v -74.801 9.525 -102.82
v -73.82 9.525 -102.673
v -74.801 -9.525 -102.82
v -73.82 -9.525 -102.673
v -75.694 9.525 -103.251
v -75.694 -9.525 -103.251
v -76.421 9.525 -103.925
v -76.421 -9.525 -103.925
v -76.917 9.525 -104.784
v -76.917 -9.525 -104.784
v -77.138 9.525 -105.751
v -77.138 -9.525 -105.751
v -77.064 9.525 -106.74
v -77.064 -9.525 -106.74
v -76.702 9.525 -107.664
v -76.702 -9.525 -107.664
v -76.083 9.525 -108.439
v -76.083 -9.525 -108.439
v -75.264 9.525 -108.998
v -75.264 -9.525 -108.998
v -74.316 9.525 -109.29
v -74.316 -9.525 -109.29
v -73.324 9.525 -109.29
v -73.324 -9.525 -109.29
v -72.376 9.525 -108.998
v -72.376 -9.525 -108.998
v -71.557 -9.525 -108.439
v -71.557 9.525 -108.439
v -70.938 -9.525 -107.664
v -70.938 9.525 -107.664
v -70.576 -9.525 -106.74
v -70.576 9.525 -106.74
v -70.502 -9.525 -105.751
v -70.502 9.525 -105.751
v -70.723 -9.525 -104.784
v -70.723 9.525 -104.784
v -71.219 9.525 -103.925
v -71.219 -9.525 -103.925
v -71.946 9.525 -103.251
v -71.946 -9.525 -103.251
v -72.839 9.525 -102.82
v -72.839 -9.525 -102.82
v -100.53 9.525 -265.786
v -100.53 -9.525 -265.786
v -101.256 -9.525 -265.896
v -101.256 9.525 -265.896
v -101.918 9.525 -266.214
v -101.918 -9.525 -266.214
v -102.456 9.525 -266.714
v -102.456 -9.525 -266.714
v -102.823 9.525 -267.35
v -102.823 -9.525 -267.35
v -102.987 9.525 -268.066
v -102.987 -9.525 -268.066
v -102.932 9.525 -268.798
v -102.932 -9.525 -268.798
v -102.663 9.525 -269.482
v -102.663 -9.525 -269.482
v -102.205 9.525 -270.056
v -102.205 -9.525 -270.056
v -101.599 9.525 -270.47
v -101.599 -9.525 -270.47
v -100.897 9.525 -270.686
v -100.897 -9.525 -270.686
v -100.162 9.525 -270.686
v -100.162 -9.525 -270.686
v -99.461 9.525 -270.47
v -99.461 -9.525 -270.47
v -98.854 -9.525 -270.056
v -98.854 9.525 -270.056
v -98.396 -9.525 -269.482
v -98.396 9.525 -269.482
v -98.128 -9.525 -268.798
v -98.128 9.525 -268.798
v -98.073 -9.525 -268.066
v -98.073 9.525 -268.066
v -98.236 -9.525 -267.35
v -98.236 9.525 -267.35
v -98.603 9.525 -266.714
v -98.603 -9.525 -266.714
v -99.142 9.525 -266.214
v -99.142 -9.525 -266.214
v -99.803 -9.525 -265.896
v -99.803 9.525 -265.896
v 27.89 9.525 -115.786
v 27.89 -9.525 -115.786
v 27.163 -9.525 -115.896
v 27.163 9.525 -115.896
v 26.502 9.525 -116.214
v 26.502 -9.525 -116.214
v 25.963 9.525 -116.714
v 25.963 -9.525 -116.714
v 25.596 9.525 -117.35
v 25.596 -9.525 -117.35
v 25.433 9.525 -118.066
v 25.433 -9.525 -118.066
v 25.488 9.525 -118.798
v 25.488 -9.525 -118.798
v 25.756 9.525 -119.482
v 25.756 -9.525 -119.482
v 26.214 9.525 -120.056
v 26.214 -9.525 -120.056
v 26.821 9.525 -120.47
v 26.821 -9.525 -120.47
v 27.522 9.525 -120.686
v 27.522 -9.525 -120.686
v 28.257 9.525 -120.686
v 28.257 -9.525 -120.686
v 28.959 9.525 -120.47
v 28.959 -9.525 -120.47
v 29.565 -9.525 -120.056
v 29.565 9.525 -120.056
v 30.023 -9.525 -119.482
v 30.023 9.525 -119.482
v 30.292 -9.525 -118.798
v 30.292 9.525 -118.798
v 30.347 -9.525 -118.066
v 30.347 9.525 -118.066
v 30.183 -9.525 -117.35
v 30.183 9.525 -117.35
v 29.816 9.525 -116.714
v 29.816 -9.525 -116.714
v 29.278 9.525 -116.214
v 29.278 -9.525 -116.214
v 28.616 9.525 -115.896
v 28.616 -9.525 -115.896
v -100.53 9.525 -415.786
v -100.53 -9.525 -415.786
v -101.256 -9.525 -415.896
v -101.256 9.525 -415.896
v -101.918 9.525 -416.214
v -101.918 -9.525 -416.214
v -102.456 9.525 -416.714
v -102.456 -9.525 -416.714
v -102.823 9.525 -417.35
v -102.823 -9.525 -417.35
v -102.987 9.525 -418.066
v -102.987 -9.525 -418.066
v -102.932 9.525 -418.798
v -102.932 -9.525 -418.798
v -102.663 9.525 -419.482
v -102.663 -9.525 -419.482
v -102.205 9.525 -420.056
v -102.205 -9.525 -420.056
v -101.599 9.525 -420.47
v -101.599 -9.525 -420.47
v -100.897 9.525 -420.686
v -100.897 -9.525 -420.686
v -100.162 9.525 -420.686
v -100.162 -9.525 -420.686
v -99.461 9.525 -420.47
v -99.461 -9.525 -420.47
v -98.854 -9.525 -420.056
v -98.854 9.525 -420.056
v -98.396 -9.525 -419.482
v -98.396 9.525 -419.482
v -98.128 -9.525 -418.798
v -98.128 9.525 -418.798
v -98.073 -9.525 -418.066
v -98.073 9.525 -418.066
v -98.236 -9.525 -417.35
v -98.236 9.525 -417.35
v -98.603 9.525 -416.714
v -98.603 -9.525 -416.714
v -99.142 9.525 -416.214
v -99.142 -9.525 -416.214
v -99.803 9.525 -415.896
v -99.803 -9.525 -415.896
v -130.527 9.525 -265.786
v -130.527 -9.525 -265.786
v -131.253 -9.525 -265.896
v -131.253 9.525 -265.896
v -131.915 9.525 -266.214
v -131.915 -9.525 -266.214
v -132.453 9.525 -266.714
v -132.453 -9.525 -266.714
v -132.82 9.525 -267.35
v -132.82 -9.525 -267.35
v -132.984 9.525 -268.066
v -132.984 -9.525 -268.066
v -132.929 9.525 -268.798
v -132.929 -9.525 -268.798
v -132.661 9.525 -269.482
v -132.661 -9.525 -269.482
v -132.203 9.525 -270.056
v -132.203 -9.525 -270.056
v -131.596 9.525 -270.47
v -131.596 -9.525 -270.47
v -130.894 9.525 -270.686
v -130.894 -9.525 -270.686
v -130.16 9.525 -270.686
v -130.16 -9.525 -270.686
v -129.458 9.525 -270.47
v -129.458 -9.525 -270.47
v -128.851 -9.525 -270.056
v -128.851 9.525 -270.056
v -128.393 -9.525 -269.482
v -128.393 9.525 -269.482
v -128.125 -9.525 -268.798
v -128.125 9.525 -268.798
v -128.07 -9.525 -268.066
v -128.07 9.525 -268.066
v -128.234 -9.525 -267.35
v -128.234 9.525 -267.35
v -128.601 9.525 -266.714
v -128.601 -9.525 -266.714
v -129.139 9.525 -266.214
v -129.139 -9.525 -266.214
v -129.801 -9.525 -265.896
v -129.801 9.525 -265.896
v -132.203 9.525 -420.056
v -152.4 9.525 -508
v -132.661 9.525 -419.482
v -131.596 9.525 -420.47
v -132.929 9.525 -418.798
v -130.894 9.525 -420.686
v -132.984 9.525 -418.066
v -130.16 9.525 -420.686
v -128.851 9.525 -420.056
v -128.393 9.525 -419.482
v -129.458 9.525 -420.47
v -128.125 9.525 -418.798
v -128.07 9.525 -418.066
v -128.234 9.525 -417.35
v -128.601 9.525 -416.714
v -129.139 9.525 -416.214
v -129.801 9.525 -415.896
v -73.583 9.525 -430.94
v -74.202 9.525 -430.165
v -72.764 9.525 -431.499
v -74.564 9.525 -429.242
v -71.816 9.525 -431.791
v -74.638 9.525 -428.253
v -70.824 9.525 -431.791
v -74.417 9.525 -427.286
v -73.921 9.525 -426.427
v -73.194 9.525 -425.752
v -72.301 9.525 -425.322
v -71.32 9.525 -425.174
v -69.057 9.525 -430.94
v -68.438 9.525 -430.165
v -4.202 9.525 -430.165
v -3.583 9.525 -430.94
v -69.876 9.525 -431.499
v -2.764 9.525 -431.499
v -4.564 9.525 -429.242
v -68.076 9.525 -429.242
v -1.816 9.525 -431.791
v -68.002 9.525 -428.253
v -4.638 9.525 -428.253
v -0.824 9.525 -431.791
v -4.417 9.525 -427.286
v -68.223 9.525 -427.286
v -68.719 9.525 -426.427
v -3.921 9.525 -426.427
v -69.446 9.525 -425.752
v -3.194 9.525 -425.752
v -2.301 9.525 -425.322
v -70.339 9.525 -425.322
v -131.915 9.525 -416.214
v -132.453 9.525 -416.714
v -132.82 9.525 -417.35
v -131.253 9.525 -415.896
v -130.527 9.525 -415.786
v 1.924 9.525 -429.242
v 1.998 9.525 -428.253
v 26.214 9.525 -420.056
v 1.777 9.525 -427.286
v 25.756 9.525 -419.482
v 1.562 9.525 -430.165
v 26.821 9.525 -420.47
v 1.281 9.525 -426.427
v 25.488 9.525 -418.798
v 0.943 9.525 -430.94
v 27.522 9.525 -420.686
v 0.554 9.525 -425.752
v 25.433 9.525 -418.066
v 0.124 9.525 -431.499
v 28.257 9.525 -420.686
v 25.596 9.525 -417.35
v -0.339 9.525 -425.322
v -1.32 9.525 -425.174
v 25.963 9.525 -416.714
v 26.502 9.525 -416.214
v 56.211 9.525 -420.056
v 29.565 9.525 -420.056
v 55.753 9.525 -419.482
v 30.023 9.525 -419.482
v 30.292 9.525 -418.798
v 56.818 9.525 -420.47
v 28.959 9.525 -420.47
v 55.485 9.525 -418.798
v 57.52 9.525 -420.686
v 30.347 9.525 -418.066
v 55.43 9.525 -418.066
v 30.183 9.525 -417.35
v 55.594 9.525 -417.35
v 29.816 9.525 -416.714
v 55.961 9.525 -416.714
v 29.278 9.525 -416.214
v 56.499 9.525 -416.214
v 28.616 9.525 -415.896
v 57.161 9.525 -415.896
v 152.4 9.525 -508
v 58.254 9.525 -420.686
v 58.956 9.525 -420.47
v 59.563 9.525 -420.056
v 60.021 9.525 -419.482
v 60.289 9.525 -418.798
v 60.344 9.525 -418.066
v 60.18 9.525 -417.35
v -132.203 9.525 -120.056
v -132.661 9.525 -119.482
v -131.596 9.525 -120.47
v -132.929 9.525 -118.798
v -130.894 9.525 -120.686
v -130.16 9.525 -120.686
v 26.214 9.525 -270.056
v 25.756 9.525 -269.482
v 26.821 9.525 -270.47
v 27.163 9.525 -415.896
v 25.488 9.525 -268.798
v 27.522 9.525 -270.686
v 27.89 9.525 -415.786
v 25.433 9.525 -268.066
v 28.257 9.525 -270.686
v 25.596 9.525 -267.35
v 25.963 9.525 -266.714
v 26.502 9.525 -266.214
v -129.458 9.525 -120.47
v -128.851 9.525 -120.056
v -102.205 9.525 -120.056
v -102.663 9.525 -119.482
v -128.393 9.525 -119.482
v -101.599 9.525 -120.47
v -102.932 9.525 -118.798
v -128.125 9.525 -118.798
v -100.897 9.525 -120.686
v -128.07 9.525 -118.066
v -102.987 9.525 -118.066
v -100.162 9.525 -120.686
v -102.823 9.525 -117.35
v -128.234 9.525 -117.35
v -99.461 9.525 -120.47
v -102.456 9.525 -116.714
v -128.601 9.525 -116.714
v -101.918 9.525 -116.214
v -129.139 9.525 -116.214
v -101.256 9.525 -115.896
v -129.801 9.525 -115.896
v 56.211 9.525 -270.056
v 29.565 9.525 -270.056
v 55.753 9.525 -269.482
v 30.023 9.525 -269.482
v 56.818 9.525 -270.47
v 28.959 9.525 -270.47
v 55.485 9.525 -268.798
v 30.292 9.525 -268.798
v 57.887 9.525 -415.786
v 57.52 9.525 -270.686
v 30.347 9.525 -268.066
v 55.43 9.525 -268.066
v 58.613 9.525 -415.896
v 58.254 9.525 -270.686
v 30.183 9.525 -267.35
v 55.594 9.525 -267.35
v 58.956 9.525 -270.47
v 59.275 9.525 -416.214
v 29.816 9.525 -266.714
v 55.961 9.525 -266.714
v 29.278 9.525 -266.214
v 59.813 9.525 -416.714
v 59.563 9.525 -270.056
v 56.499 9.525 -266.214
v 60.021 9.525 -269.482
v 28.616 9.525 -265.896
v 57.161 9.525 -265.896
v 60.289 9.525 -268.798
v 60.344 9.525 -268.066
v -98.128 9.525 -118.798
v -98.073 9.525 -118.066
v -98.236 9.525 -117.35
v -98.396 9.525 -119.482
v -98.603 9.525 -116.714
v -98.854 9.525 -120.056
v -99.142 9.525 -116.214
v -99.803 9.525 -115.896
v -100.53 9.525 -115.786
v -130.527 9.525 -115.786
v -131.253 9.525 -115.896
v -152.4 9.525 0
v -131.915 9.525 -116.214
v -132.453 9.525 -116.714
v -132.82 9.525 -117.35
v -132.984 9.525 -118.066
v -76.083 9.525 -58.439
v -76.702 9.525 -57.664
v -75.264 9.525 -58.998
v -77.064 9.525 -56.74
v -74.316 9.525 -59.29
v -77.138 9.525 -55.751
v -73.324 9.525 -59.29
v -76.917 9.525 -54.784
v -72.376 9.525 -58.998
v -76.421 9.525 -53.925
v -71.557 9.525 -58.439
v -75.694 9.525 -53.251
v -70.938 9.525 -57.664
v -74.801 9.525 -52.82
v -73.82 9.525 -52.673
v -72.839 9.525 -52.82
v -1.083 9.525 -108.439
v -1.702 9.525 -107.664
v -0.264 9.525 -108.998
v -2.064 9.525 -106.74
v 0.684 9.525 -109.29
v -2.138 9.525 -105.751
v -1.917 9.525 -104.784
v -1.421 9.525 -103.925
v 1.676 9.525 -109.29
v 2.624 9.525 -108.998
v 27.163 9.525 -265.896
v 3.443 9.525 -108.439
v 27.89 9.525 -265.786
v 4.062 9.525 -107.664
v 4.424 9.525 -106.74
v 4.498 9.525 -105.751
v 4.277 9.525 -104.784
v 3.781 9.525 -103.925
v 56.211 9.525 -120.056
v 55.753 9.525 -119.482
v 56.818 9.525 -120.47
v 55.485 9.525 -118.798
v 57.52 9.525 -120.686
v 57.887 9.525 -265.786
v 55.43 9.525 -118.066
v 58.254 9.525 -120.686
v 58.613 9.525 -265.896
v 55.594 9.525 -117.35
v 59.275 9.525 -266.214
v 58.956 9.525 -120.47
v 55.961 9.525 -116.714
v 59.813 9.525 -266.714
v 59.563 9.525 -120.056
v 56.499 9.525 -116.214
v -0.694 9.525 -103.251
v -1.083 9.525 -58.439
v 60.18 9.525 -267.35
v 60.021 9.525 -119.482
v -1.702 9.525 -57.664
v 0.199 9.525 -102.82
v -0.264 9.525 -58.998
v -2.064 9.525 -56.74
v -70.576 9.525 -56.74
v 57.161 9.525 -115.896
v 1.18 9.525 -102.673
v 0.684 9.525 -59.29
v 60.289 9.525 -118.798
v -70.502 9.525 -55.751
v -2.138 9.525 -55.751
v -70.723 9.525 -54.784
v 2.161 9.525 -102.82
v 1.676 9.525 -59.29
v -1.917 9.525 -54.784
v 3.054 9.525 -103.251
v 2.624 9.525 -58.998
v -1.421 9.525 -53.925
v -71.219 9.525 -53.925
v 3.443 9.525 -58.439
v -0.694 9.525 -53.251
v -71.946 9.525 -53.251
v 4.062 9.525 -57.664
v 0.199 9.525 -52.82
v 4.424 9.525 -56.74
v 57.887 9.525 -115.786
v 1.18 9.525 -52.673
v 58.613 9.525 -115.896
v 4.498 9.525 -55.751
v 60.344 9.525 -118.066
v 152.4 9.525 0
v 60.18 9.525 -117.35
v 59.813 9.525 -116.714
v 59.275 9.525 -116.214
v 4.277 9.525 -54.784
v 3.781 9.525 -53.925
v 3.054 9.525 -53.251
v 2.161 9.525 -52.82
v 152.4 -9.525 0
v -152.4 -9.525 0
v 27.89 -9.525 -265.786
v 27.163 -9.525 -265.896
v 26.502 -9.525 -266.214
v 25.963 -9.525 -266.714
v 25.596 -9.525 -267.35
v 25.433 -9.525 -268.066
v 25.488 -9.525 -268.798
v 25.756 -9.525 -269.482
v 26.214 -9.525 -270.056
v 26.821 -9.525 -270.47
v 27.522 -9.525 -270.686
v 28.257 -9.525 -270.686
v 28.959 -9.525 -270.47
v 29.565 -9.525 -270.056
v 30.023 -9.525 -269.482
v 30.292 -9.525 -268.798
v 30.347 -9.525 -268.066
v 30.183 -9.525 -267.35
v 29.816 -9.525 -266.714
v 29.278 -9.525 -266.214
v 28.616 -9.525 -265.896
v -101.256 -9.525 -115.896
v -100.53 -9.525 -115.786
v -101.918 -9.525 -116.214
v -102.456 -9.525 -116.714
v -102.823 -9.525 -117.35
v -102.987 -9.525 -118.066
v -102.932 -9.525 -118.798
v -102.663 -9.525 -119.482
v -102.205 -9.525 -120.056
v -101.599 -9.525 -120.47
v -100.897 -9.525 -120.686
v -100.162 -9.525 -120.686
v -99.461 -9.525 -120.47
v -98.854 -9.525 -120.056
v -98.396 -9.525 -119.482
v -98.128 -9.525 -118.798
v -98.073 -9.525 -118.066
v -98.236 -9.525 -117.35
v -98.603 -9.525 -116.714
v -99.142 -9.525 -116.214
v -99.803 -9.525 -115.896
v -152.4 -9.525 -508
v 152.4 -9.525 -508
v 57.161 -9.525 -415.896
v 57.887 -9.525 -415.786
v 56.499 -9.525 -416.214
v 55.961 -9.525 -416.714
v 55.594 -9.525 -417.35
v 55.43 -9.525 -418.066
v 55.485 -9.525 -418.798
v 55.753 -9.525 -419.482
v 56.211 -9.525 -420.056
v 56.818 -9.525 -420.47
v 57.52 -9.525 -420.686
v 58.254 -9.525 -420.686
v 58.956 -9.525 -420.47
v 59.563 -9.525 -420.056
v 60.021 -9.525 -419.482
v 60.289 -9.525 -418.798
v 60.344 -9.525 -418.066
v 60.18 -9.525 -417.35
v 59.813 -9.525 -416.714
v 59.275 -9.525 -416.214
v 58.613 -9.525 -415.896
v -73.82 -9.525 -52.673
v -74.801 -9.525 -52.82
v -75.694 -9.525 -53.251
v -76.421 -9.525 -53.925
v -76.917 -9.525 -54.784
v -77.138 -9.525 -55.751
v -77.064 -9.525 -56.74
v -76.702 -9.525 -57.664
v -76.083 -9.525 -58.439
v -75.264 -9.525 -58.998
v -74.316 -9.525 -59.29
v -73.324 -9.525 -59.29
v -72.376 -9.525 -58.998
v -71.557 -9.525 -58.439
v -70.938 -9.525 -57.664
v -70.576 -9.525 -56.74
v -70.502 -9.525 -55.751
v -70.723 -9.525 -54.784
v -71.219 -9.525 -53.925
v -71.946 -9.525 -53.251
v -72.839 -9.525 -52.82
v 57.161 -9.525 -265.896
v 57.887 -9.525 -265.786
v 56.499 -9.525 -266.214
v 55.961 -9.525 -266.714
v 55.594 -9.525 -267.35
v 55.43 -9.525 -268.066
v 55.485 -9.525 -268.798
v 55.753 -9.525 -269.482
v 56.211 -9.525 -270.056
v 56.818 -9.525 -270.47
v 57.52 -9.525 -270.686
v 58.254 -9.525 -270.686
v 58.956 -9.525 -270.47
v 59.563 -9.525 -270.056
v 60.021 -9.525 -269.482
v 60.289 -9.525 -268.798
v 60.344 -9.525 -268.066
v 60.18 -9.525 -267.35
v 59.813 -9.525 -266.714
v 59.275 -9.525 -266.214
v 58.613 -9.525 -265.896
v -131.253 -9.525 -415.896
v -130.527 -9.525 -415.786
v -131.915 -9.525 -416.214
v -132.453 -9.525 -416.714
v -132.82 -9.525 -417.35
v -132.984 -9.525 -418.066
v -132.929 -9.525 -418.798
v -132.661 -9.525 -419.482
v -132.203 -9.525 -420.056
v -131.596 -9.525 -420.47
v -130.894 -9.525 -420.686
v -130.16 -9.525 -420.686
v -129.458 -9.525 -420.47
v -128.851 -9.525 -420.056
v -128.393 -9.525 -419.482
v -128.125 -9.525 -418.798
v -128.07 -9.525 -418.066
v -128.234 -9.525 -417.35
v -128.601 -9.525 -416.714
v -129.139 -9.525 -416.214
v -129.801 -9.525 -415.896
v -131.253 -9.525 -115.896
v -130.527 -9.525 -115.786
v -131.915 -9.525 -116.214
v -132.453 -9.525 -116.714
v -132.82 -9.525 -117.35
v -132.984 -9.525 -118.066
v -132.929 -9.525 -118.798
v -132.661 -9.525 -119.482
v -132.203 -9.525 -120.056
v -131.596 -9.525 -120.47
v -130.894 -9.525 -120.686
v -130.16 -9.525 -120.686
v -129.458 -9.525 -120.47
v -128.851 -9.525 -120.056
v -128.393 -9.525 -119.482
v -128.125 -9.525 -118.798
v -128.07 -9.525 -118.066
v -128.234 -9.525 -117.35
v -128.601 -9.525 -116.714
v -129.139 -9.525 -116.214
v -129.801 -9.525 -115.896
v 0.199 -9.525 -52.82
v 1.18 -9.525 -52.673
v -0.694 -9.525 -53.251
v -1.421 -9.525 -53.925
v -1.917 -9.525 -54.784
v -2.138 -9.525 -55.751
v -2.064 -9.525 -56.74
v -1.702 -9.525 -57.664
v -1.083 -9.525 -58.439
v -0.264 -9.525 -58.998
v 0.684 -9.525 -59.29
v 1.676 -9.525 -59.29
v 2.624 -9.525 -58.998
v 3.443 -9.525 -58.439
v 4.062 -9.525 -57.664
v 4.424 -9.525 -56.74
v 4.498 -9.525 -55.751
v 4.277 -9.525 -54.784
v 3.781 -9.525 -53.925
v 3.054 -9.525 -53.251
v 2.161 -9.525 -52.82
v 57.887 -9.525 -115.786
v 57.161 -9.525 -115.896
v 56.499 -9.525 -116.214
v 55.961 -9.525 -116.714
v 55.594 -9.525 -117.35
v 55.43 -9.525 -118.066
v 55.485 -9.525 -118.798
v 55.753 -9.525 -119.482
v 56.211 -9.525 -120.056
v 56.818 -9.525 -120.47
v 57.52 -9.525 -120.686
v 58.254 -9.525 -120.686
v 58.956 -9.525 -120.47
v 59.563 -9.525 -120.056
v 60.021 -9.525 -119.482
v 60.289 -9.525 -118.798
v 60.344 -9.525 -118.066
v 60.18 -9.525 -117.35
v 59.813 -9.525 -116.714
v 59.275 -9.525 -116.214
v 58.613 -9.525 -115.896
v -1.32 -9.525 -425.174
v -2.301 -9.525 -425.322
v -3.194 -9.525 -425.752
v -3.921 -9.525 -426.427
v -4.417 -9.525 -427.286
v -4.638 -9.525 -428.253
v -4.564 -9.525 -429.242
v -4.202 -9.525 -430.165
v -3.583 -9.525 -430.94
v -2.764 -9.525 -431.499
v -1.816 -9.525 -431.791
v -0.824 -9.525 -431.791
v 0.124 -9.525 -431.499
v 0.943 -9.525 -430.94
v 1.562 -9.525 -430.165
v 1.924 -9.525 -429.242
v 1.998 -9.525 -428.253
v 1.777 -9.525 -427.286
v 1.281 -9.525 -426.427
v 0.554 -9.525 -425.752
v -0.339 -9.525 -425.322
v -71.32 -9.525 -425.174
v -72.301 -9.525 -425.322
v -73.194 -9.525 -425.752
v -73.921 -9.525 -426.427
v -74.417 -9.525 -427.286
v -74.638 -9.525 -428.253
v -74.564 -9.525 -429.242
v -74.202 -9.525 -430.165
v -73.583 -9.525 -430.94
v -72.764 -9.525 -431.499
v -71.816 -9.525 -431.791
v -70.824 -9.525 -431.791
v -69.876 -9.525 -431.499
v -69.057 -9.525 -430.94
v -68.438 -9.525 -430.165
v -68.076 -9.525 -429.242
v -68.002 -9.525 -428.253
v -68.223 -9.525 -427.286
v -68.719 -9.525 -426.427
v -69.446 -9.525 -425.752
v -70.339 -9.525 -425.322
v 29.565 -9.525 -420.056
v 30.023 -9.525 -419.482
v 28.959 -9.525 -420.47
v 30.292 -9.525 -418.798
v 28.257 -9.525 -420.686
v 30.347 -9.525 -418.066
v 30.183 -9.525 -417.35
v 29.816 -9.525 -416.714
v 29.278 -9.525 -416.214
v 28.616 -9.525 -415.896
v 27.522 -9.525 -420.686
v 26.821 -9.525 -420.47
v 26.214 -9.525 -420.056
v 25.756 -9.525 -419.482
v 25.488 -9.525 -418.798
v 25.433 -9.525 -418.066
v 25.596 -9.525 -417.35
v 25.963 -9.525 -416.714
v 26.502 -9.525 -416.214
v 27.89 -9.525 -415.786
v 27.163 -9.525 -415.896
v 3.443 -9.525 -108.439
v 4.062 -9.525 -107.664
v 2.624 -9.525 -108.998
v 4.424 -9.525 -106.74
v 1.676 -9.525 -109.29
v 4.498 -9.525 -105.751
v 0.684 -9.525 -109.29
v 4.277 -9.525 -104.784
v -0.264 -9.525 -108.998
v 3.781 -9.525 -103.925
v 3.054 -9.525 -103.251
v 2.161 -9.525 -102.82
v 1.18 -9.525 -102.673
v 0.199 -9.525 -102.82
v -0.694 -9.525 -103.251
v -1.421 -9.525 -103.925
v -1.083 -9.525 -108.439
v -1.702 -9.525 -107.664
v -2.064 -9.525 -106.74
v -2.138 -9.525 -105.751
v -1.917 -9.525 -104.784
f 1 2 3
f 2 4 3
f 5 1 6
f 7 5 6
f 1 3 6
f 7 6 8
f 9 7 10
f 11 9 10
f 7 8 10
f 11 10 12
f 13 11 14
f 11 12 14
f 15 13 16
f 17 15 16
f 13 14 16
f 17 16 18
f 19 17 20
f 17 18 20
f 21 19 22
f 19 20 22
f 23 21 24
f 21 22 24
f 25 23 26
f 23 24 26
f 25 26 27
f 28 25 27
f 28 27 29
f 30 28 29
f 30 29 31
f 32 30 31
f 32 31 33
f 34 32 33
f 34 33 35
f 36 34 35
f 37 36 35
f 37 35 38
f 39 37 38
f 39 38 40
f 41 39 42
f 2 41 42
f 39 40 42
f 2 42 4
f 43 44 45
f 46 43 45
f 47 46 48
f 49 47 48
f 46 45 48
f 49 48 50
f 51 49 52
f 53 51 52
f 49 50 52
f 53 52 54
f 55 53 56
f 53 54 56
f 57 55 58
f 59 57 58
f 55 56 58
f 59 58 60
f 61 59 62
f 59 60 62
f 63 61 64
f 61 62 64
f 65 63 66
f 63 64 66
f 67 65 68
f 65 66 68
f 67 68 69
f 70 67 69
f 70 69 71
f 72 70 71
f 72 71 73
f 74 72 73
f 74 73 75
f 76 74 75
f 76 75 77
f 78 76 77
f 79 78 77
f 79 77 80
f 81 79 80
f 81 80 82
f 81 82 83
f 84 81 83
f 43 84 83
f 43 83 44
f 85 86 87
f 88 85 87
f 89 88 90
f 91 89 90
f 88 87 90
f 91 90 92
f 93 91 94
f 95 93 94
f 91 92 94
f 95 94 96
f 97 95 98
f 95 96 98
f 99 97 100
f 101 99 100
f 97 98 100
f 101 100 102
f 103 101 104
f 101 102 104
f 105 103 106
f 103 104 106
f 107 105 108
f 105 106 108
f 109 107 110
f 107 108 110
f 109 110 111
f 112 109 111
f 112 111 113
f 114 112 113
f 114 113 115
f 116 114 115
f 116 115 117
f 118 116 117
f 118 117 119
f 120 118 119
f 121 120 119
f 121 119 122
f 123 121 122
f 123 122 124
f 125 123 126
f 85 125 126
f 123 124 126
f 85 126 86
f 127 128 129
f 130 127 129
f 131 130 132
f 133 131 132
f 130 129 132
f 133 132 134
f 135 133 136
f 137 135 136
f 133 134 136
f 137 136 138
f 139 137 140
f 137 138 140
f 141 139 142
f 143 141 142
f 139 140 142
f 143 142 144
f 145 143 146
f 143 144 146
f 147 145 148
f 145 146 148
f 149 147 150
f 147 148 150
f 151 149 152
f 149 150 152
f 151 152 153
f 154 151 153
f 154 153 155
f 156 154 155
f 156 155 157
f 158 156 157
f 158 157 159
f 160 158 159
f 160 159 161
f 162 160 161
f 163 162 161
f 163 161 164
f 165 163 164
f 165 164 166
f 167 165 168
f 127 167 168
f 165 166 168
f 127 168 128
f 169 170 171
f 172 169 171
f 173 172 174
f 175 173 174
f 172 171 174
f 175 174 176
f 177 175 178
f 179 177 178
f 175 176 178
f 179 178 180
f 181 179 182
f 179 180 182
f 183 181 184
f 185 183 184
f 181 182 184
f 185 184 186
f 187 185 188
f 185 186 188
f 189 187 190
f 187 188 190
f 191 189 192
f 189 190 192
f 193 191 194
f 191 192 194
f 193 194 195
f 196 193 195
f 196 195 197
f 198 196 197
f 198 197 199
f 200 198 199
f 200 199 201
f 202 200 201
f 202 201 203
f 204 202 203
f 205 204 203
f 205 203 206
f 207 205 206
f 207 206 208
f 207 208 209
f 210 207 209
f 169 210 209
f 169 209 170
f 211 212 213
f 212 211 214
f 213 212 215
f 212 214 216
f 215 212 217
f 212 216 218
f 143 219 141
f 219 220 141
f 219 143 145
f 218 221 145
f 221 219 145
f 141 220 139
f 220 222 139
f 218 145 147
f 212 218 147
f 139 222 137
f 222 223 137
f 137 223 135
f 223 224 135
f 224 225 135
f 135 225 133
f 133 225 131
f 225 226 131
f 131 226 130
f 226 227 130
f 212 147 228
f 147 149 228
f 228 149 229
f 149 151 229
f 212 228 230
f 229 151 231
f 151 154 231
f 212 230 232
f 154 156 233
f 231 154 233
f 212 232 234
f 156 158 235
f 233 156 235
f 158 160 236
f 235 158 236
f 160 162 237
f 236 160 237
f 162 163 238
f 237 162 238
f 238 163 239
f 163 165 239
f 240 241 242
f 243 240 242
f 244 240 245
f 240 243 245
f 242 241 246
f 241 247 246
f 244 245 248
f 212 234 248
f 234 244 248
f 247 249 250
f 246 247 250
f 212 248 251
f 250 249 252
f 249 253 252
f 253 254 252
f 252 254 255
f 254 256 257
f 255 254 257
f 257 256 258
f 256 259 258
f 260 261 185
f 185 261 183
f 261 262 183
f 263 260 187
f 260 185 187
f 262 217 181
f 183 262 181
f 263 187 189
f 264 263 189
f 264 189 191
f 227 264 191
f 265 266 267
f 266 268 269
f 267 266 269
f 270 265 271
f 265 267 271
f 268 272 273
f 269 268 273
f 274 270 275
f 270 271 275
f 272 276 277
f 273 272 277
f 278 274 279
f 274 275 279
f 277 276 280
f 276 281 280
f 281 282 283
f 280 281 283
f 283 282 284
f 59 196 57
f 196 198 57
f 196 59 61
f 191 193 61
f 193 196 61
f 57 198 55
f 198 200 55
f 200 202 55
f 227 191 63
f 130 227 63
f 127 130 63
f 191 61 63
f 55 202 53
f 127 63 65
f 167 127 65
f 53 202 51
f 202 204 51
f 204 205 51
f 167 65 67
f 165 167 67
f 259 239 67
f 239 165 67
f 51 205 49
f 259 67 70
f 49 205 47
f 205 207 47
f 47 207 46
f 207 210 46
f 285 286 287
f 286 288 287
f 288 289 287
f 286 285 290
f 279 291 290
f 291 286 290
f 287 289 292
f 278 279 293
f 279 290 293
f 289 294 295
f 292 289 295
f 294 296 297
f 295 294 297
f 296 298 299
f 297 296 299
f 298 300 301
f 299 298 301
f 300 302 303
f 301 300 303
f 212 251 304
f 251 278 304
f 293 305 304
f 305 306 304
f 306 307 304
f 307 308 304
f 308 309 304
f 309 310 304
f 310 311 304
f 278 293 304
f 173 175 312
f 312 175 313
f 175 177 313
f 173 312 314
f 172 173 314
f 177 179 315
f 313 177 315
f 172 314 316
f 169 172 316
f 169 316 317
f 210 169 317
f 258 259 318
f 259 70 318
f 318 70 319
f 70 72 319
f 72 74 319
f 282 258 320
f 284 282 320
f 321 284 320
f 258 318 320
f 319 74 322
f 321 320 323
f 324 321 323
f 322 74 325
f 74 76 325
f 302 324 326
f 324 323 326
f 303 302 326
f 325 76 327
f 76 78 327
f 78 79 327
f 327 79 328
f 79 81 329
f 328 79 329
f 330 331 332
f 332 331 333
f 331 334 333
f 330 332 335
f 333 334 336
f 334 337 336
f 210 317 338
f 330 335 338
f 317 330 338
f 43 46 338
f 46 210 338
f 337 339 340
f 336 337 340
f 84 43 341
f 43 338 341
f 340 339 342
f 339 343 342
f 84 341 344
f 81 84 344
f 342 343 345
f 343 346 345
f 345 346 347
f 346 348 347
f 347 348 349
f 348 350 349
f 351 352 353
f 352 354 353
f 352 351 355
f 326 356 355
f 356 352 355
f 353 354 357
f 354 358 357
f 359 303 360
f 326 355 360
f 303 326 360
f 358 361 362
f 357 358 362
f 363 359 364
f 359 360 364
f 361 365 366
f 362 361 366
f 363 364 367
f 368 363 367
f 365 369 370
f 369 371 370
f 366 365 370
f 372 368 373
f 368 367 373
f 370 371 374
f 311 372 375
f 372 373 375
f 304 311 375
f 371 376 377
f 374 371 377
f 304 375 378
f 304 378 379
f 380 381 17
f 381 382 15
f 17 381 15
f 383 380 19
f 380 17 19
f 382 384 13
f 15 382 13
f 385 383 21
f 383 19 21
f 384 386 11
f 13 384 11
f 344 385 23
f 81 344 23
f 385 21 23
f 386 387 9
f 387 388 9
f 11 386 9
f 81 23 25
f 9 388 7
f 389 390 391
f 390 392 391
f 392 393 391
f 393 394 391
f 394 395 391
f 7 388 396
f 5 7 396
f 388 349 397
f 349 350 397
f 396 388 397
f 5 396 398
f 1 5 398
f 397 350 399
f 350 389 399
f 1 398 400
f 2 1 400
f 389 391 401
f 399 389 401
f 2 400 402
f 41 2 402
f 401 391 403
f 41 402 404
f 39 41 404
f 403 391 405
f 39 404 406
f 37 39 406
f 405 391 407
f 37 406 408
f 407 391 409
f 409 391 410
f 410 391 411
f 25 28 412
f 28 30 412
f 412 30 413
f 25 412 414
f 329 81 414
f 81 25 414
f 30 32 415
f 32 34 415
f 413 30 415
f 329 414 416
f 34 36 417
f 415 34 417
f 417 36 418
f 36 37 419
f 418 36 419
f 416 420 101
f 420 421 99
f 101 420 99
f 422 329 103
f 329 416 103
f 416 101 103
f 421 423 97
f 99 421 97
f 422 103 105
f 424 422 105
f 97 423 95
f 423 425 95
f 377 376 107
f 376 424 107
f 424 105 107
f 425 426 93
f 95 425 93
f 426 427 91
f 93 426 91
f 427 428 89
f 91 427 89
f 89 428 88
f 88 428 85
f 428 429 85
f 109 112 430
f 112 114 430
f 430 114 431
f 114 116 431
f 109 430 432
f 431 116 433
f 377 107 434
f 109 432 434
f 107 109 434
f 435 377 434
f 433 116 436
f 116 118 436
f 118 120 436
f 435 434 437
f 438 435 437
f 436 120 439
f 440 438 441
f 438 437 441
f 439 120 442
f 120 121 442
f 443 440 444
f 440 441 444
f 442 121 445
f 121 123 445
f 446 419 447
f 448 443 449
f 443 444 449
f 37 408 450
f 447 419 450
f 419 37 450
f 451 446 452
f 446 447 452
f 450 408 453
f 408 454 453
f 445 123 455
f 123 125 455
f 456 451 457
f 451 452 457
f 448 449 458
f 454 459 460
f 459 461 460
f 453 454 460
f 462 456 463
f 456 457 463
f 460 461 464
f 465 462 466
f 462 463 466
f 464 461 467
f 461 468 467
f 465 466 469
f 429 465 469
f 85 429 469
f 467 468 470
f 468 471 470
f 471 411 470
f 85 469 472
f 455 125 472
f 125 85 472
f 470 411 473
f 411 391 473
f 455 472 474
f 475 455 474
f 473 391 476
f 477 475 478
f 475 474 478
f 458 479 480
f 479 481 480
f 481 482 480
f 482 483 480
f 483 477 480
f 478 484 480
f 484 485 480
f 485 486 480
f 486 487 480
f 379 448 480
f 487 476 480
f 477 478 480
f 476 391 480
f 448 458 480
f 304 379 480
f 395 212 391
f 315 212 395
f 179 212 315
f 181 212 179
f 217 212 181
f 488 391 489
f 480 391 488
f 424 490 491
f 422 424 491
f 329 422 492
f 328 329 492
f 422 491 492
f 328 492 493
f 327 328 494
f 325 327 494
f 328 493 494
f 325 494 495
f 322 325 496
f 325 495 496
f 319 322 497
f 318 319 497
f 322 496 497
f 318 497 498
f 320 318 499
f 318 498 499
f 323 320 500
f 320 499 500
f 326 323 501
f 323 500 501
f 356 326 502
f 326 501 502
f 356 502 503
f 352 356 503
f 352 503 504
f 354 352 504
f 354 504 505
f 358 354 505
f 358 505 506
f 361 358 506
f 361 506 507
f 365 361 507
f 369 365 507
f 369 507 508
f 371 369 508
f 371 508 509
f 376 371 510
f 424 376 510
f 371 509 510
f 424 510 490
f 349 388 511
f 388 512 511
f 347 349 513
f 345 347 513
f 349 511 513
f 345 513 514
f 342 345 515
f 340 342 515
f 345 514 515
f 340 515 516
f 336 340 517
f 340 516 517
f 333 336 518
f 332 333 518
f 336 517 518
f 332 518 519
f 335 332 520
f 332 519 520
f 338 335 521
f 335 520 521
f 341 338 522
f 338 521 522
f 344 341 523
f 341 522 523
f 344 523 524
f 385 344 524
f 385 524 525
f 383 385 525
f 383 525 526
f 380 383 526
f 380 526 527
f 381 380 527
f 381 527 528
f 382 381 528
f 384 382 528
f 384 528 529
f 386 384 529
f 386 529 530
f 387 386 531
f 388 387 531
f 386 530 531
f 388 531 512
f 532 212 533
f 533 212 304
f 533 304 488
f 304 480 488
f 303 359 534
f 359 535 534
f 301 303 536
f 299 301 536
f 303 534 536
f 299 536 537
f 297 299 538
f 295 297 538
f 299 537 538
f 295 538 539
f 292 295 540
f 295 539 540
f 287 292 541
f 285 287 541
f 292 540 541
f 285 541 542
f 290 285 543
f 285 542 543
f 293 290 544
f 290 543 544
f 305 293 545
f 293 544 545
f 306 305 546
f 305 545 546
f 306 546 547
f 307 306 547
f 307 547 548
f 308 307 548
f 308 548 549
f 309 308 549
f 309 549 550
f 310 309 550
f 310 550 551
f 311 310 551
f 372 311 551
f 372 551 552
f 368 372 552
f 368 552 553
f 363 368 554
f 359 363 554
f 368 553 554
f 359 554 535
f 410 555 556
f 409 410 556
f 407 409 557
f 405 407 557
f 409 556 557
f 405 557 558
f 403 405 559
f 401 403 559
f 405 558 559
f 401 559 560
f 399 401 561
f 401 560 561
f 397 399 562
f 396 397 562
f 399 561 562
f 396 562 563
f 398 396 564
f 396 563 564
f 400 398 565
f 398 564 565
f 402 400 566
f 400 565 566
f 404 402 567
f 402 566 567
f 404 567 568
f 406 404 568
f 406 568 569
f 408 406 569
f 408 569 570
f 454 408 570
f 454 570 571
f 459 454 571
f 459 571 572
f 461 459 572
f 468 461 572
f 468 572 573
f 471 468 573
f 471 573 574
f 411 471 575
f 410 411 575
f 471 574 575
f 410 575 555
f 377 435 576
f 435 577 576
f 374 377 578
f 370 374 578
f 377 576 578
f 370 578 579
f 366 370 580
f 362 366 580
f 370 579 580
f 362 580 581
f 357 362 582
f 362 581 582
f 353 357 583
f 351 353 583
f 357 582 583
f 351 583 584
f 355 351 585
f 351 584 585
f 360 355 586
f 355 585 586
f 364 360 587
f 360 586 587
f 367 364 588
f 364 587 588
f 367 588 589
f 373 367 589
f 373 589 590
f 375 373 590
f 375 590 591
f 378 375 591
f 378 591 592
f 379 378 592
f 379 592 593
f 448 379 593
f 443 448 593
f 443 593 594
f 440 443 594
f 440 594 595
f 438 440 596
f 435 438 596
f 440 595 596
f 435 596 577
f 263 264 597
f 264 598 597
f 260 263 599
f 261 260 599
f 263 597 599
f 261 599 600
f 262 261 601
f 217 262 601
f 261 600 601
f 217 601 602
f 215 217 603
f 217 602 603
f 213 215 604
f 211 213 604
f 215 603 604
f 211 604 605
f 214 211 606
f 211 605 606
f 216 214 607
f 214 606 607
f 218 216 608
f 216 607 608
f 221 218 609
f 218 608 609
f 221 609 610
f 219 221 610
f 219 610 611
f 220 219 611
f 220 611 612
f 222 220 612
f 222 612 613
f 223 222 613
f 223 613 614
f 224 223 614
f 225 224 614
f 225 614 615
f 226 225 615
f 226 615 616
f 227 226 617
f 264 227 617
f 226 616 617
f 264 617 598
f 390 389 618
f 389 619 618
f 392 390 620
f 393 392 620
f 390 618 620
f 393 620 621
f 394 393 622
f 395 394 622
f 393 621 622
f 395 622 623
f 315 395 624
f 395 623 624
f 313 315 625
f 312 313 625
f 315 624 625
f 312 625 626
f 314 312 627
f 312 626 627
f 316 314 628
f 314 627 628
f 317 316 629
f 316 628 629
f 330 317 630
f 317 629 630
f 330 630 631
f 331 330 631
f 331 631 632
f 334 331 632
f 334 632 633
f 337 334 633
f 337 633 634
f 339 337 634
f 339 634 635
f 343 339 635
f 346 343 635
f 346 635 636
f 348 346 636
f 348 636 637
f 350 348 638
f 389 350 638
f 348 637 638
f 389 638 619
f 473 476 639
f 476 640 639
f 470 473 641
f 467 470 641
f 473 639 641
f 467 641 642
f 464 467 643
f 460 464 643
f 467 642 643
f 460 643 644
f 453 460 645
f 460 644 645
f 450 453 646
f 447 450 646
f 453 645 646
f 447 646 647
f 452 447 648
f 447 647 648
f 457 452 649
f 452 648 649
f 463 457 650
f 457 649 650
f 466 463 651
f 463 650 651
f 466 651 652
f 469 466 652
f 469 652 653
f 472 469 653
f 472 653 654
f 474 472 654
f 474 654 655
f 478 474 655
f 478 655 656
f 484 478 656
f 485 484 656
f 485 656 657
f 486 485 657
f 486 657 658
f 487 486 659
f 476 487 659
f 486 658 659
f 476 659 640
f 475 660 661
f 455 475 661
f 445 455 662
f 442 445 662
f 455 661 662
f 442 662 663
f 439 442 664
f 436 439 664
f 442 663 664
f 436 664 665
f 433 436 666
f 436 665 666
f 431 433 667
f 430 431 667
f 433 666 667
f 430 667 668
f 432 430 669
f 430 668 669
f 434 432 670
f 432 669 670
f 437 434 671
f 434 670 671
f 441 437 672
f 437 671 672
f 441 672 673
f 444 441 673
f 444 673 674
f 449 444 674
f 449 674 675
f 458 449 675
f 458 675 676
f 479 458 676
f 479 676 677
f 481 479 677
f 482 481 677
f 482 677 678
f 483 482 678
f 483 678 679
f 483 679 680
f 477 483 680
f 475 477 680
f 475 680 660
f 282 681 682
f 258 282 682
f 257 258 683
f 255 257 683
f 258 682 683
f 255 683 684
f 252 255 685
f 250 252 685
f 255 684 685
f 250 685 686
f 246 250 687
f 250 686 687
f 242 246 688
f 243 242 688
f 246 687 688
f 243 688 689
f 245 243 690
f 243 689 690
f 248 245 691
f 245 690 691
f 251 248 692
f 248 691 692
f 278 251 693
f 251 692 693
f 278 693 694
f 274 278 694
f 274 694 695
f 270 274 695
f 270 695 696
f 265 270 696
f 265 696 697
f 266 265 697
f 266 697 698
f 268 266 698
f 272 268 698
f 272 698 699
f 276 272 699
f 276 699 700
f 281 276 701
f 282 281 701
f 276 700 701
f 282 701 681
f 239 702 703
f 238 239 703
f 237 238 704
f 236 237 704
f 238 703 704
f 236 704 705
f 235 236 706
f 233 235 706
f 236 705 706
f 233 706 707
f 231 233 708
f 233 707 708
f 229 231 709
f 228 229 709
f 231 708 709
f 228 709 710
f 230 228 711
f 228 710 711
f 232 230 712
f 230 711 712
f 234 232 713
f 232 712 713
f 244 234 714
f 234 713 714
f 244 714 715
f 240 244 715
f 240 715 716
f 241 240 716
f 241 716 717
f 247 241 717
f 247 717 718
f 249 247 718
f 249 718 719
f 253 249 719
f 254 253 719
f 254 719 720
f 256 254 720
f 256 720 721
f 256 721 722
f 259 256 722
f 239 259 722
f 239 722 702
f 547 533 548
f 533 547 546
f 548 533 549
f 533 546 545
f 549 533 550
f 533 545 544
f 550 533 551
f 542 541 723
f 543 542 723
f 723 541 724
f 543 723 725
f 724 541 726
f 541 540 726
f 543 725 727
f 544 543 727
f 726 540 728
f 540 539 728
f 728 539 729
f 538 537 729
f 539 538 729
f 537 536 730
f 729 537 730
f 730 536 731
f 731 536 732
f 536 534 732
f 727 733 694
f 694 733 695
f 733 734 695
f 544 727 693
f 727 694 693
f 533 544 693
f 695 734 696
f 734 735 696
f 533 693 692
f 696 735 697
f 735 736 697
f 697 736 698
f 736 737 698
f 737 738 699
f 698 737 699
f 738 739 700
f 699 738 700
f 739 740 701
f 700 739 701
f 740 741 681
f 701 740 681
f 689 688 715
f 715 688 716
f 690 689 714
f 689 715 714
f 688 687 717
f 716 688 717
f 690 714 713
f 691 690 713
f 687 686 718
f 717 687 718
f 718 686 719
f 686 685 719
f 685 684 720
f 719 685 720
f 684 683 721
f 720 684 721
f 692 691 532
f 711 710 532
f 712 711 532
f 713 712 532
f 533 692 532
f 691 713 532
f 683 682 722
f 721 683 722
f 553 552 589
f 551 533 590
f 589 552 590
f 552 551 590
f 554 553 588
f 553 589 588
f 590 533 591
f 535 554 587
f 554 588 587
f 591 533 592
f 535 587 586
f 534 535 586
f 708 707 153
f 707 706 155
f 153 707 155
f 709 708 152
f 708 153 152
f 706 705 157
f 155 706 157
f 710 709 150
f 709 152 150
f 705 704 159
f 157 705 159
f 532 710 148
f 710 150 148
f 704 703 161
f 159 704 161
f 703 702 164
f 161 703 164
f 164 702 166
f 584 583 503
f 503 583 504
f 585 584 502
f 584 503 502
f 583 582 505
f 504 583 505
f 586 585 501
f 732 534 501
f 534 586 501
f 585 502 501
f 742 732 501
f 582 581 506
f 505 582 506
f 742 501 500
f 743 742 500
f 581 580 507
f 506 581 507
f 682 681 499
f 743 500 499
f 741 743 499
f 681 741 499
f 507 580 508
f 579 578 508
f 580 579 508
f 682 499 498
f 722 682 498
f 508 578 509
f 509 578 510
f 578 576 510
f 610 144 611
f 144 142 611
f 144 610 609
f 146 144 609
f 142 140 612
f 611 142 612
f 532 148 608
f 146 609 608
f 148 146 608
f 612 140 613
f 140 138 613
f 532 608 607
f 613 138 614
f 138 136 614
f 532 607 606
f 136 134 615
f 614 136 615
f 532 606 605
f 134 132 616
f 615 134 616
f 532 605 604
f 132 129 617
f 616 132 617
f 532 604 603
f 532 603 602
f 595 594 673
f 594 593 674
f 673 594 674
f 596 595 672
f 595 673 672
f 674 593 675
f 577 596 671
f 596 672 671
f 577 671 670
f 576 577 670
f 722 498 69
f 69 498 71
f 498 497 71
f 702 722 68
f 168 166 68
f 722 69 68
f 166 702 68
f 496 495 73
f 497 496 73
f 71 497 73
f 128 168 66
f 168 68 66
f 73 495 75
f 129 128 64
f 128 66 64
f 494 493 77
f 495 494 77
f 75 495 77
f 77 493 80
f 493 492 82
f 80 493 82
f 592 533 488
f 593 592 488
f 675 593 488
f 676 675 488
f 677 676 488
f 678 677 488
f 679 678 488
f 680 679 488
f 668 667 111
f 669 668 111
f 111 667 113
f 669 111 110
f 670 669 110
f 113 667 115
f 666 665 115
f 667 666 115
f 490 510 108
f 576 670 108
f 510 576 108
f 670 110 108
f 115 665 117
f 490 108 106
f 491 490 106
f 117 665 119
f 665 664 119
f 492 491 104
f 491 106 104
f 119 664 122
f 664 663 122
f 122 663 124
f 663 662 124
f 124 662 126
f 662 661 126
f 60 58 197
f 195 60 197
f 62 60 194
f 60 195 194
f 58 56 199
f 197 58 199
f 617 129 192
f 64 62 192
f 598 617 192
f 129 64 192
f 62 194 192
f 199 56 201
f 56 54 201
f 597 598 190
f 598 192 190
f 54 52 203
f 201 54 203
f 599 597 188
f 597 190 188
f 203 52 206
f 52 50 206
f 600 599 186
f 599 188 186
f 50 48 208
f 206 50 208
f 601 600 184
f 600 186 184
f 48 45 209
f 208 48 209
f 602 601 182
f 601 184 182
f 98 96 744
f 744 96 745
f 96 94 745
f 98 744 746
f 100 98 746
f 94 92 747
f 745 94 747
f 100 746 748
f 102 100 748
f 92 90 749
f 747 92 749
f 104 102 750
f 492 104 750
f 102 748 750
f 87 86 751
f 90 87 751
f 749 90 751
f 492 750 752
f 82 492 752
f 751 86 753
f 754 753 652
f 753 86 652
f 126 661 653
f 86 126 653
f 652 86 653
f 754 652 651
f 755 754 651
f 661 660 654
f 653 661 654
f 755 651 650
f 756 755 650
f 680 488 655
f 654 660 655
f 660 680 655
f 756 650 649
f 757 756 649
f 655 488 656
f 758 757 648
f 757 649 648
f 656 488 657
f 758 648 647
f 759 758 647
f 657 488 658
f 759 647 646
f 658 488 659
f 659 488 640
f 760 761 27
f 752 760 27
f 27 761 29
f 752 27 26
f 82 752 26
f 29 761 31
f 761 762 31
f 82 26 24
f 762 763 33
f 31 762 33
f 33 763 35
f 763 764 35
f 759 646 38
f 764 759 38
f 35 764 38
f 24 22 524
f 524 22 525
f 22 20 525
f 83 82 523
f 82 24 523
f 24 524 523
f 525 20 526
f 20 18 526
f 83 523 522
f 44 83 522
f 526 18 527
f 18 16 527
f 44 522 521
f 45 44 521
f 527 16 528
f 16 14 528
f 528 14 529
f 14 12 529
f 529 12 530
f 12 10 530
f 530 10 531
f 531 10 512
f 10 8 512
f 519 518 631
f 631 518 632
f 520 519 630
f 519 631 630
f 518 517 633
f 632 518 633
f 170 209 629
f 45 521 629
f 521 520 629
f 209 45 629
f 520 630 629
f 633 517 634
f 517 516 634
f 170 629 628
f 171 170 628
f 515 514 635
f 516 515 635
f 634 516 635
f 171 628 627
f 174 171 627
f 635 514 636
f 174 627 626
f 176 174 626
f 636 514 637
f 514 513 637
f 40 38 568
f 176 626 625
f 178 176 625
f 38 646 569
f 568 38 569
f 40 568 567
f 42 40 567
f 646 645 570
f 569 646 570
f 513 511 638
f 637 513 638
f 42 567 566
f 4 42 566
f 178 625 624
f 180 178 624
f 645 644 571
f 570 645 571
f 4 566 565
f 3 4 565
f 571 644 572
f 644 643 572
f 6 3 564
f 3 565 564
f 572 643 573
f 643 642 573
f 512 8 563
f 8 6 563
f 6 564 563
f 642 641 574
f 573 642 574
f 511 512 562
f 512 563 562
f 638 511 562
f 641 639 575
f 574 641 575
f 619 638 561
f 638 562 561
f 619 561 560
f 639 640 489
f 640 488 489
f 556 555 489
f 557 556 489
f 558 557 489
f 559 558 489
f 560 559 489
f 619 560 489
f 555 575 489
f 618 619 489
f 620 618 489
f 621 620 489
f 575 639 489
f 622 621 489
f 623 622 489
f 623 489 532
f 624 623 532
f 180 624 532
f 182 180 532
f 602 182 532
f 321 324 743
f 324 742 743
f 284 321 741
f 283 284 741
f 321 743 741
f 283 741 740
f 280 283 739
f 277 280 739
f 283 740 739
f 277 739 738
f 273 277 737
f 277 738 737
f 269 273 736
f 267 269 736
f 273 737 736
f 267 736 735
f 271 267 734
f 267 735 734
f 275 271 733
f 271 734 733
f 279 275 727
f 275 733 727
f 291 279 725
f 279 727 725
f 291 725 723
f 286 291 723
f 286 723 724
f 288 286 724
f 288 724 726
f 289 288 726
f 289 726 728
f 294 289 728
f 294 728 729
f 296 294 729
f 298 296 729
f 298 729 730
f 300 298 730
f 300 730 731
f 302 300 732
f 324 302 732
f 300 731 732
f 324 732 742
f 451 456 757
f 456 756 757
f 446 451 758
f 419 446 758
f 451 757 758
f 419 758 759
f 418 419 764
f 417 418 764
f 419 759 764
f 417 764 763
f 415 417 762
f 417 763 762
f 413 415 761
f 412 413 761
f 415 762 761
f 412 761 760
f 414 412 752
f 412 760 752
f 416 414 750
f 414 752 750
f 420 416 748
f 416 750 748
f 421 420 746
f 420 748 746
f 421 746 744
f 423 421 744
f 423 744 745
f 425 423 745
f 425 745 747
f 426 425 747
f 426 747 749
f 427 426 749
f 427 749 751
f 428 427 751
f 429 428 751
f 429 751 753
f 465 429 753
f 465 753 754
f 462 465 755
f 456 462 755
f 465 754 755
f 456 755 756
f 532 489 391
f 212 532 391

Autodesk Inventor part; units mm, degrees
ref_plane "YZ Plane" through (0, 0, 0) normal (1, 0, 0) x (0, 1, 0)
ref_plane "XZ Plane" through (0, 0, 0) normal (0, 1, 0) x (-1, 0, 0)
ref_plane "XY Plane" through (0, 0, 0) normal (0, 0, 1) x (1, 0, 0)
sketch "Sketch1" plane through (0, 0, 0) normal (0, 0, 1) x (1, 0, 0)
  line L0 (-152.4, 9.525) -> (152.4, 9.525)
  line L1 (152.4, 9.525) -> (152.4, -9.525)
  line L2 (152.4, -9.525) -> (-152.4, -9.525)
  line L3 (-152.4, -9.525) -> (-152.4, 9.525)
  line L4 (-152.4, 9.525) -> (152.4, -9.525) construction
  line L5 (152.4, 9.525) -> (-152.4, -9.525) construction
  point P0 (0, 0)
  dimension "d0" = 304.8
  dimension "d1" = 19.05
extrude "Extrusion1" add sketch "Sketch1" against normal blind 508
sketch "Sketch2" plane through (-152.4, 9.525, 0) normal (0, 1, 0) x (1, 0, 0)
  line L0 (0, 0) -> (0, 508) projected
  line L1 (0, 0) -> (304.8, 0) projected
  point P0 (152.4, 0)
  point P1 (78.58, 56)
  dimension "d4" = 78.58
  dimension "d5" = 56
hole "Hole1" at (-73.82, 9.525, -56) direction (0, -1, 0) diameter 6.6548 end through all
pattern_linear "Rectangular Pattern1" count 2 spacing 50 along (0, 0, -1) count 2 spacing 75 along (1, 0, 0) of "Hole1"
sketch "Sketch3" plane through (-152.4, 9.525, 0) normal (0, 1, 0) x (1, 0, 0)
  line L0 (0, 0) -> (304.8, 0) projected
  line L1 (0, 0) -> (0, 508) projected
  point P0 (152.4, 0)
  point P1 (81.08, 428.5012)
  point P2 (151.08, 428.5012)
  dimension "d25" = 428.5012
  dimension "d26" = 81.08
  dimension "d27" = 428.5012
  dimension "d28" = 70
hole "Hole2" at (-71.32, 9.525, -428.5012) at (-1.32, 9.525, -428.5012) direction (0, -1, 0) diameter 6.6548 end through all
sketch "Sketch4" plane through (-152.4, 9.525, 0) normal (0, 1, 0) x (1, 0, 0)
  line L0 (0, 0) -> (0, 508) projected
  line L1 (0, 0) -> (304.8, 0) projected
  point P0 (152.4, 0)
  point P1 (21.873, 118.25)
  dimension "d36" = 21.873
  dimension "d37" = 118.25
hole "Hole3" at (-130.527, 9.525, -118.25) direction (0, -1, 0) diameter 4.9276 end through all
pattern_linear "Rectangular Pattern3" count 3 spacing 150 along (0, 0, -1) count 2 spacing 29.9974 along (1, 0, 0) of "Hole3"
sketch "Sketch5" plane through (-152.4, 9.525, 0) normal (0, 1, 0) x (1, 0, 0)
  line L0 (304.8, 0) -> (304.8, 508) projected
  line L1 (0, 0) -> (304.8, 0) projected
  point P0 (152.4, 0)
  point P1 (210.287, 118.25)
  dimension "d51" = 94.513
  dimension "d52" = 118.25
hole "Hole4" at (57.887, 9.525, -118.25) direction (0, -1, 0) diameter 4.9276 end through all
pattern_linear "Rectangular Pattern4" count 3 spacing 150 along (0, 0, -1) count 2 spacing 29.9974 along (-1, 0, 0) of "Hole4"
equation "\"d0\" = mp_wid"
equation "\"d1\" = mp_thick"
equation "\"d2\" = mp_len"
equation "\"d4\" = mp_mbra_holes_w_offset"
equation "\"d5\" = mp_mbra_holes_l_offset"
equation "\"d15\" = mp_mbra_holes_l_spacing"
equation "\"d18\" = mp_mbra_holes_w_spacing"
equation "\"d25\" = mp_bf_holes_l_offset"
equation "\"d26\" = mp_bf_holes_w_offset"
equation "\"d27\" = mp_bf_holes_l_offset"
equation "\"d28\" = mp_bf_holes_w_spacing"
equation "\"d36\" = mp_brm_w_offset + brm_hole_h_offset"
equation "\"d37\" = asse_brm_l_offset + brm_hole_v_offset"
equation "\"d47\" = brm_hole_v_spacing"
equation "\"d50\" = brm_hole_h_spacing"
equation "\"d51\" = mp_brm_w_offset_right + brm_hole_h_offset"
equation "\"d52\" = asse_brm_l_offset + brm_hole_v_offset"
equation "\"d62\" = brm_hole_v_spacing"
equation "\"d65\" = brm_hole_h_spacing"
equation "\"mp_wid\" = 304.8"
equation "\"mp_thick\" = 19.05"
equation "\"mp_len\" = 508"
equation "\"mp_mbra_holes_l_spacing\" = 50"
equation "\"mp_mbra_holes_w_spacing\" = 75"
equation "\"brm_hole_v_spacing\" = 150"
equation "\"brm_hole_h_spacing\" = 29.9974"
equation "\"mp_mbra_holes_w_offset\" = 78.58"
equation "\"mp_mbra_holes_l_offset\" = 56"
equation "\"mp_bf_holes_l_offset\" = 428.50116"
equation "\"mp_bf_holes_w_offset\" = 81.08"
equation "\"mp_bf_holes_w_spacing\" = 70"
equation "\"mp_brm_w_offset\" = 14.38"
equation "\"brm_hole_h_offset\" = 7.493"
equation "\"asse_brm_l_offset\" = 68.25"
equation "\"brm_hole_v_offset\" = 50"
equation "\"mp_brm_w_offset_right\" = 87.02"
properties part number "mplate" material "Aluminum 6061"
